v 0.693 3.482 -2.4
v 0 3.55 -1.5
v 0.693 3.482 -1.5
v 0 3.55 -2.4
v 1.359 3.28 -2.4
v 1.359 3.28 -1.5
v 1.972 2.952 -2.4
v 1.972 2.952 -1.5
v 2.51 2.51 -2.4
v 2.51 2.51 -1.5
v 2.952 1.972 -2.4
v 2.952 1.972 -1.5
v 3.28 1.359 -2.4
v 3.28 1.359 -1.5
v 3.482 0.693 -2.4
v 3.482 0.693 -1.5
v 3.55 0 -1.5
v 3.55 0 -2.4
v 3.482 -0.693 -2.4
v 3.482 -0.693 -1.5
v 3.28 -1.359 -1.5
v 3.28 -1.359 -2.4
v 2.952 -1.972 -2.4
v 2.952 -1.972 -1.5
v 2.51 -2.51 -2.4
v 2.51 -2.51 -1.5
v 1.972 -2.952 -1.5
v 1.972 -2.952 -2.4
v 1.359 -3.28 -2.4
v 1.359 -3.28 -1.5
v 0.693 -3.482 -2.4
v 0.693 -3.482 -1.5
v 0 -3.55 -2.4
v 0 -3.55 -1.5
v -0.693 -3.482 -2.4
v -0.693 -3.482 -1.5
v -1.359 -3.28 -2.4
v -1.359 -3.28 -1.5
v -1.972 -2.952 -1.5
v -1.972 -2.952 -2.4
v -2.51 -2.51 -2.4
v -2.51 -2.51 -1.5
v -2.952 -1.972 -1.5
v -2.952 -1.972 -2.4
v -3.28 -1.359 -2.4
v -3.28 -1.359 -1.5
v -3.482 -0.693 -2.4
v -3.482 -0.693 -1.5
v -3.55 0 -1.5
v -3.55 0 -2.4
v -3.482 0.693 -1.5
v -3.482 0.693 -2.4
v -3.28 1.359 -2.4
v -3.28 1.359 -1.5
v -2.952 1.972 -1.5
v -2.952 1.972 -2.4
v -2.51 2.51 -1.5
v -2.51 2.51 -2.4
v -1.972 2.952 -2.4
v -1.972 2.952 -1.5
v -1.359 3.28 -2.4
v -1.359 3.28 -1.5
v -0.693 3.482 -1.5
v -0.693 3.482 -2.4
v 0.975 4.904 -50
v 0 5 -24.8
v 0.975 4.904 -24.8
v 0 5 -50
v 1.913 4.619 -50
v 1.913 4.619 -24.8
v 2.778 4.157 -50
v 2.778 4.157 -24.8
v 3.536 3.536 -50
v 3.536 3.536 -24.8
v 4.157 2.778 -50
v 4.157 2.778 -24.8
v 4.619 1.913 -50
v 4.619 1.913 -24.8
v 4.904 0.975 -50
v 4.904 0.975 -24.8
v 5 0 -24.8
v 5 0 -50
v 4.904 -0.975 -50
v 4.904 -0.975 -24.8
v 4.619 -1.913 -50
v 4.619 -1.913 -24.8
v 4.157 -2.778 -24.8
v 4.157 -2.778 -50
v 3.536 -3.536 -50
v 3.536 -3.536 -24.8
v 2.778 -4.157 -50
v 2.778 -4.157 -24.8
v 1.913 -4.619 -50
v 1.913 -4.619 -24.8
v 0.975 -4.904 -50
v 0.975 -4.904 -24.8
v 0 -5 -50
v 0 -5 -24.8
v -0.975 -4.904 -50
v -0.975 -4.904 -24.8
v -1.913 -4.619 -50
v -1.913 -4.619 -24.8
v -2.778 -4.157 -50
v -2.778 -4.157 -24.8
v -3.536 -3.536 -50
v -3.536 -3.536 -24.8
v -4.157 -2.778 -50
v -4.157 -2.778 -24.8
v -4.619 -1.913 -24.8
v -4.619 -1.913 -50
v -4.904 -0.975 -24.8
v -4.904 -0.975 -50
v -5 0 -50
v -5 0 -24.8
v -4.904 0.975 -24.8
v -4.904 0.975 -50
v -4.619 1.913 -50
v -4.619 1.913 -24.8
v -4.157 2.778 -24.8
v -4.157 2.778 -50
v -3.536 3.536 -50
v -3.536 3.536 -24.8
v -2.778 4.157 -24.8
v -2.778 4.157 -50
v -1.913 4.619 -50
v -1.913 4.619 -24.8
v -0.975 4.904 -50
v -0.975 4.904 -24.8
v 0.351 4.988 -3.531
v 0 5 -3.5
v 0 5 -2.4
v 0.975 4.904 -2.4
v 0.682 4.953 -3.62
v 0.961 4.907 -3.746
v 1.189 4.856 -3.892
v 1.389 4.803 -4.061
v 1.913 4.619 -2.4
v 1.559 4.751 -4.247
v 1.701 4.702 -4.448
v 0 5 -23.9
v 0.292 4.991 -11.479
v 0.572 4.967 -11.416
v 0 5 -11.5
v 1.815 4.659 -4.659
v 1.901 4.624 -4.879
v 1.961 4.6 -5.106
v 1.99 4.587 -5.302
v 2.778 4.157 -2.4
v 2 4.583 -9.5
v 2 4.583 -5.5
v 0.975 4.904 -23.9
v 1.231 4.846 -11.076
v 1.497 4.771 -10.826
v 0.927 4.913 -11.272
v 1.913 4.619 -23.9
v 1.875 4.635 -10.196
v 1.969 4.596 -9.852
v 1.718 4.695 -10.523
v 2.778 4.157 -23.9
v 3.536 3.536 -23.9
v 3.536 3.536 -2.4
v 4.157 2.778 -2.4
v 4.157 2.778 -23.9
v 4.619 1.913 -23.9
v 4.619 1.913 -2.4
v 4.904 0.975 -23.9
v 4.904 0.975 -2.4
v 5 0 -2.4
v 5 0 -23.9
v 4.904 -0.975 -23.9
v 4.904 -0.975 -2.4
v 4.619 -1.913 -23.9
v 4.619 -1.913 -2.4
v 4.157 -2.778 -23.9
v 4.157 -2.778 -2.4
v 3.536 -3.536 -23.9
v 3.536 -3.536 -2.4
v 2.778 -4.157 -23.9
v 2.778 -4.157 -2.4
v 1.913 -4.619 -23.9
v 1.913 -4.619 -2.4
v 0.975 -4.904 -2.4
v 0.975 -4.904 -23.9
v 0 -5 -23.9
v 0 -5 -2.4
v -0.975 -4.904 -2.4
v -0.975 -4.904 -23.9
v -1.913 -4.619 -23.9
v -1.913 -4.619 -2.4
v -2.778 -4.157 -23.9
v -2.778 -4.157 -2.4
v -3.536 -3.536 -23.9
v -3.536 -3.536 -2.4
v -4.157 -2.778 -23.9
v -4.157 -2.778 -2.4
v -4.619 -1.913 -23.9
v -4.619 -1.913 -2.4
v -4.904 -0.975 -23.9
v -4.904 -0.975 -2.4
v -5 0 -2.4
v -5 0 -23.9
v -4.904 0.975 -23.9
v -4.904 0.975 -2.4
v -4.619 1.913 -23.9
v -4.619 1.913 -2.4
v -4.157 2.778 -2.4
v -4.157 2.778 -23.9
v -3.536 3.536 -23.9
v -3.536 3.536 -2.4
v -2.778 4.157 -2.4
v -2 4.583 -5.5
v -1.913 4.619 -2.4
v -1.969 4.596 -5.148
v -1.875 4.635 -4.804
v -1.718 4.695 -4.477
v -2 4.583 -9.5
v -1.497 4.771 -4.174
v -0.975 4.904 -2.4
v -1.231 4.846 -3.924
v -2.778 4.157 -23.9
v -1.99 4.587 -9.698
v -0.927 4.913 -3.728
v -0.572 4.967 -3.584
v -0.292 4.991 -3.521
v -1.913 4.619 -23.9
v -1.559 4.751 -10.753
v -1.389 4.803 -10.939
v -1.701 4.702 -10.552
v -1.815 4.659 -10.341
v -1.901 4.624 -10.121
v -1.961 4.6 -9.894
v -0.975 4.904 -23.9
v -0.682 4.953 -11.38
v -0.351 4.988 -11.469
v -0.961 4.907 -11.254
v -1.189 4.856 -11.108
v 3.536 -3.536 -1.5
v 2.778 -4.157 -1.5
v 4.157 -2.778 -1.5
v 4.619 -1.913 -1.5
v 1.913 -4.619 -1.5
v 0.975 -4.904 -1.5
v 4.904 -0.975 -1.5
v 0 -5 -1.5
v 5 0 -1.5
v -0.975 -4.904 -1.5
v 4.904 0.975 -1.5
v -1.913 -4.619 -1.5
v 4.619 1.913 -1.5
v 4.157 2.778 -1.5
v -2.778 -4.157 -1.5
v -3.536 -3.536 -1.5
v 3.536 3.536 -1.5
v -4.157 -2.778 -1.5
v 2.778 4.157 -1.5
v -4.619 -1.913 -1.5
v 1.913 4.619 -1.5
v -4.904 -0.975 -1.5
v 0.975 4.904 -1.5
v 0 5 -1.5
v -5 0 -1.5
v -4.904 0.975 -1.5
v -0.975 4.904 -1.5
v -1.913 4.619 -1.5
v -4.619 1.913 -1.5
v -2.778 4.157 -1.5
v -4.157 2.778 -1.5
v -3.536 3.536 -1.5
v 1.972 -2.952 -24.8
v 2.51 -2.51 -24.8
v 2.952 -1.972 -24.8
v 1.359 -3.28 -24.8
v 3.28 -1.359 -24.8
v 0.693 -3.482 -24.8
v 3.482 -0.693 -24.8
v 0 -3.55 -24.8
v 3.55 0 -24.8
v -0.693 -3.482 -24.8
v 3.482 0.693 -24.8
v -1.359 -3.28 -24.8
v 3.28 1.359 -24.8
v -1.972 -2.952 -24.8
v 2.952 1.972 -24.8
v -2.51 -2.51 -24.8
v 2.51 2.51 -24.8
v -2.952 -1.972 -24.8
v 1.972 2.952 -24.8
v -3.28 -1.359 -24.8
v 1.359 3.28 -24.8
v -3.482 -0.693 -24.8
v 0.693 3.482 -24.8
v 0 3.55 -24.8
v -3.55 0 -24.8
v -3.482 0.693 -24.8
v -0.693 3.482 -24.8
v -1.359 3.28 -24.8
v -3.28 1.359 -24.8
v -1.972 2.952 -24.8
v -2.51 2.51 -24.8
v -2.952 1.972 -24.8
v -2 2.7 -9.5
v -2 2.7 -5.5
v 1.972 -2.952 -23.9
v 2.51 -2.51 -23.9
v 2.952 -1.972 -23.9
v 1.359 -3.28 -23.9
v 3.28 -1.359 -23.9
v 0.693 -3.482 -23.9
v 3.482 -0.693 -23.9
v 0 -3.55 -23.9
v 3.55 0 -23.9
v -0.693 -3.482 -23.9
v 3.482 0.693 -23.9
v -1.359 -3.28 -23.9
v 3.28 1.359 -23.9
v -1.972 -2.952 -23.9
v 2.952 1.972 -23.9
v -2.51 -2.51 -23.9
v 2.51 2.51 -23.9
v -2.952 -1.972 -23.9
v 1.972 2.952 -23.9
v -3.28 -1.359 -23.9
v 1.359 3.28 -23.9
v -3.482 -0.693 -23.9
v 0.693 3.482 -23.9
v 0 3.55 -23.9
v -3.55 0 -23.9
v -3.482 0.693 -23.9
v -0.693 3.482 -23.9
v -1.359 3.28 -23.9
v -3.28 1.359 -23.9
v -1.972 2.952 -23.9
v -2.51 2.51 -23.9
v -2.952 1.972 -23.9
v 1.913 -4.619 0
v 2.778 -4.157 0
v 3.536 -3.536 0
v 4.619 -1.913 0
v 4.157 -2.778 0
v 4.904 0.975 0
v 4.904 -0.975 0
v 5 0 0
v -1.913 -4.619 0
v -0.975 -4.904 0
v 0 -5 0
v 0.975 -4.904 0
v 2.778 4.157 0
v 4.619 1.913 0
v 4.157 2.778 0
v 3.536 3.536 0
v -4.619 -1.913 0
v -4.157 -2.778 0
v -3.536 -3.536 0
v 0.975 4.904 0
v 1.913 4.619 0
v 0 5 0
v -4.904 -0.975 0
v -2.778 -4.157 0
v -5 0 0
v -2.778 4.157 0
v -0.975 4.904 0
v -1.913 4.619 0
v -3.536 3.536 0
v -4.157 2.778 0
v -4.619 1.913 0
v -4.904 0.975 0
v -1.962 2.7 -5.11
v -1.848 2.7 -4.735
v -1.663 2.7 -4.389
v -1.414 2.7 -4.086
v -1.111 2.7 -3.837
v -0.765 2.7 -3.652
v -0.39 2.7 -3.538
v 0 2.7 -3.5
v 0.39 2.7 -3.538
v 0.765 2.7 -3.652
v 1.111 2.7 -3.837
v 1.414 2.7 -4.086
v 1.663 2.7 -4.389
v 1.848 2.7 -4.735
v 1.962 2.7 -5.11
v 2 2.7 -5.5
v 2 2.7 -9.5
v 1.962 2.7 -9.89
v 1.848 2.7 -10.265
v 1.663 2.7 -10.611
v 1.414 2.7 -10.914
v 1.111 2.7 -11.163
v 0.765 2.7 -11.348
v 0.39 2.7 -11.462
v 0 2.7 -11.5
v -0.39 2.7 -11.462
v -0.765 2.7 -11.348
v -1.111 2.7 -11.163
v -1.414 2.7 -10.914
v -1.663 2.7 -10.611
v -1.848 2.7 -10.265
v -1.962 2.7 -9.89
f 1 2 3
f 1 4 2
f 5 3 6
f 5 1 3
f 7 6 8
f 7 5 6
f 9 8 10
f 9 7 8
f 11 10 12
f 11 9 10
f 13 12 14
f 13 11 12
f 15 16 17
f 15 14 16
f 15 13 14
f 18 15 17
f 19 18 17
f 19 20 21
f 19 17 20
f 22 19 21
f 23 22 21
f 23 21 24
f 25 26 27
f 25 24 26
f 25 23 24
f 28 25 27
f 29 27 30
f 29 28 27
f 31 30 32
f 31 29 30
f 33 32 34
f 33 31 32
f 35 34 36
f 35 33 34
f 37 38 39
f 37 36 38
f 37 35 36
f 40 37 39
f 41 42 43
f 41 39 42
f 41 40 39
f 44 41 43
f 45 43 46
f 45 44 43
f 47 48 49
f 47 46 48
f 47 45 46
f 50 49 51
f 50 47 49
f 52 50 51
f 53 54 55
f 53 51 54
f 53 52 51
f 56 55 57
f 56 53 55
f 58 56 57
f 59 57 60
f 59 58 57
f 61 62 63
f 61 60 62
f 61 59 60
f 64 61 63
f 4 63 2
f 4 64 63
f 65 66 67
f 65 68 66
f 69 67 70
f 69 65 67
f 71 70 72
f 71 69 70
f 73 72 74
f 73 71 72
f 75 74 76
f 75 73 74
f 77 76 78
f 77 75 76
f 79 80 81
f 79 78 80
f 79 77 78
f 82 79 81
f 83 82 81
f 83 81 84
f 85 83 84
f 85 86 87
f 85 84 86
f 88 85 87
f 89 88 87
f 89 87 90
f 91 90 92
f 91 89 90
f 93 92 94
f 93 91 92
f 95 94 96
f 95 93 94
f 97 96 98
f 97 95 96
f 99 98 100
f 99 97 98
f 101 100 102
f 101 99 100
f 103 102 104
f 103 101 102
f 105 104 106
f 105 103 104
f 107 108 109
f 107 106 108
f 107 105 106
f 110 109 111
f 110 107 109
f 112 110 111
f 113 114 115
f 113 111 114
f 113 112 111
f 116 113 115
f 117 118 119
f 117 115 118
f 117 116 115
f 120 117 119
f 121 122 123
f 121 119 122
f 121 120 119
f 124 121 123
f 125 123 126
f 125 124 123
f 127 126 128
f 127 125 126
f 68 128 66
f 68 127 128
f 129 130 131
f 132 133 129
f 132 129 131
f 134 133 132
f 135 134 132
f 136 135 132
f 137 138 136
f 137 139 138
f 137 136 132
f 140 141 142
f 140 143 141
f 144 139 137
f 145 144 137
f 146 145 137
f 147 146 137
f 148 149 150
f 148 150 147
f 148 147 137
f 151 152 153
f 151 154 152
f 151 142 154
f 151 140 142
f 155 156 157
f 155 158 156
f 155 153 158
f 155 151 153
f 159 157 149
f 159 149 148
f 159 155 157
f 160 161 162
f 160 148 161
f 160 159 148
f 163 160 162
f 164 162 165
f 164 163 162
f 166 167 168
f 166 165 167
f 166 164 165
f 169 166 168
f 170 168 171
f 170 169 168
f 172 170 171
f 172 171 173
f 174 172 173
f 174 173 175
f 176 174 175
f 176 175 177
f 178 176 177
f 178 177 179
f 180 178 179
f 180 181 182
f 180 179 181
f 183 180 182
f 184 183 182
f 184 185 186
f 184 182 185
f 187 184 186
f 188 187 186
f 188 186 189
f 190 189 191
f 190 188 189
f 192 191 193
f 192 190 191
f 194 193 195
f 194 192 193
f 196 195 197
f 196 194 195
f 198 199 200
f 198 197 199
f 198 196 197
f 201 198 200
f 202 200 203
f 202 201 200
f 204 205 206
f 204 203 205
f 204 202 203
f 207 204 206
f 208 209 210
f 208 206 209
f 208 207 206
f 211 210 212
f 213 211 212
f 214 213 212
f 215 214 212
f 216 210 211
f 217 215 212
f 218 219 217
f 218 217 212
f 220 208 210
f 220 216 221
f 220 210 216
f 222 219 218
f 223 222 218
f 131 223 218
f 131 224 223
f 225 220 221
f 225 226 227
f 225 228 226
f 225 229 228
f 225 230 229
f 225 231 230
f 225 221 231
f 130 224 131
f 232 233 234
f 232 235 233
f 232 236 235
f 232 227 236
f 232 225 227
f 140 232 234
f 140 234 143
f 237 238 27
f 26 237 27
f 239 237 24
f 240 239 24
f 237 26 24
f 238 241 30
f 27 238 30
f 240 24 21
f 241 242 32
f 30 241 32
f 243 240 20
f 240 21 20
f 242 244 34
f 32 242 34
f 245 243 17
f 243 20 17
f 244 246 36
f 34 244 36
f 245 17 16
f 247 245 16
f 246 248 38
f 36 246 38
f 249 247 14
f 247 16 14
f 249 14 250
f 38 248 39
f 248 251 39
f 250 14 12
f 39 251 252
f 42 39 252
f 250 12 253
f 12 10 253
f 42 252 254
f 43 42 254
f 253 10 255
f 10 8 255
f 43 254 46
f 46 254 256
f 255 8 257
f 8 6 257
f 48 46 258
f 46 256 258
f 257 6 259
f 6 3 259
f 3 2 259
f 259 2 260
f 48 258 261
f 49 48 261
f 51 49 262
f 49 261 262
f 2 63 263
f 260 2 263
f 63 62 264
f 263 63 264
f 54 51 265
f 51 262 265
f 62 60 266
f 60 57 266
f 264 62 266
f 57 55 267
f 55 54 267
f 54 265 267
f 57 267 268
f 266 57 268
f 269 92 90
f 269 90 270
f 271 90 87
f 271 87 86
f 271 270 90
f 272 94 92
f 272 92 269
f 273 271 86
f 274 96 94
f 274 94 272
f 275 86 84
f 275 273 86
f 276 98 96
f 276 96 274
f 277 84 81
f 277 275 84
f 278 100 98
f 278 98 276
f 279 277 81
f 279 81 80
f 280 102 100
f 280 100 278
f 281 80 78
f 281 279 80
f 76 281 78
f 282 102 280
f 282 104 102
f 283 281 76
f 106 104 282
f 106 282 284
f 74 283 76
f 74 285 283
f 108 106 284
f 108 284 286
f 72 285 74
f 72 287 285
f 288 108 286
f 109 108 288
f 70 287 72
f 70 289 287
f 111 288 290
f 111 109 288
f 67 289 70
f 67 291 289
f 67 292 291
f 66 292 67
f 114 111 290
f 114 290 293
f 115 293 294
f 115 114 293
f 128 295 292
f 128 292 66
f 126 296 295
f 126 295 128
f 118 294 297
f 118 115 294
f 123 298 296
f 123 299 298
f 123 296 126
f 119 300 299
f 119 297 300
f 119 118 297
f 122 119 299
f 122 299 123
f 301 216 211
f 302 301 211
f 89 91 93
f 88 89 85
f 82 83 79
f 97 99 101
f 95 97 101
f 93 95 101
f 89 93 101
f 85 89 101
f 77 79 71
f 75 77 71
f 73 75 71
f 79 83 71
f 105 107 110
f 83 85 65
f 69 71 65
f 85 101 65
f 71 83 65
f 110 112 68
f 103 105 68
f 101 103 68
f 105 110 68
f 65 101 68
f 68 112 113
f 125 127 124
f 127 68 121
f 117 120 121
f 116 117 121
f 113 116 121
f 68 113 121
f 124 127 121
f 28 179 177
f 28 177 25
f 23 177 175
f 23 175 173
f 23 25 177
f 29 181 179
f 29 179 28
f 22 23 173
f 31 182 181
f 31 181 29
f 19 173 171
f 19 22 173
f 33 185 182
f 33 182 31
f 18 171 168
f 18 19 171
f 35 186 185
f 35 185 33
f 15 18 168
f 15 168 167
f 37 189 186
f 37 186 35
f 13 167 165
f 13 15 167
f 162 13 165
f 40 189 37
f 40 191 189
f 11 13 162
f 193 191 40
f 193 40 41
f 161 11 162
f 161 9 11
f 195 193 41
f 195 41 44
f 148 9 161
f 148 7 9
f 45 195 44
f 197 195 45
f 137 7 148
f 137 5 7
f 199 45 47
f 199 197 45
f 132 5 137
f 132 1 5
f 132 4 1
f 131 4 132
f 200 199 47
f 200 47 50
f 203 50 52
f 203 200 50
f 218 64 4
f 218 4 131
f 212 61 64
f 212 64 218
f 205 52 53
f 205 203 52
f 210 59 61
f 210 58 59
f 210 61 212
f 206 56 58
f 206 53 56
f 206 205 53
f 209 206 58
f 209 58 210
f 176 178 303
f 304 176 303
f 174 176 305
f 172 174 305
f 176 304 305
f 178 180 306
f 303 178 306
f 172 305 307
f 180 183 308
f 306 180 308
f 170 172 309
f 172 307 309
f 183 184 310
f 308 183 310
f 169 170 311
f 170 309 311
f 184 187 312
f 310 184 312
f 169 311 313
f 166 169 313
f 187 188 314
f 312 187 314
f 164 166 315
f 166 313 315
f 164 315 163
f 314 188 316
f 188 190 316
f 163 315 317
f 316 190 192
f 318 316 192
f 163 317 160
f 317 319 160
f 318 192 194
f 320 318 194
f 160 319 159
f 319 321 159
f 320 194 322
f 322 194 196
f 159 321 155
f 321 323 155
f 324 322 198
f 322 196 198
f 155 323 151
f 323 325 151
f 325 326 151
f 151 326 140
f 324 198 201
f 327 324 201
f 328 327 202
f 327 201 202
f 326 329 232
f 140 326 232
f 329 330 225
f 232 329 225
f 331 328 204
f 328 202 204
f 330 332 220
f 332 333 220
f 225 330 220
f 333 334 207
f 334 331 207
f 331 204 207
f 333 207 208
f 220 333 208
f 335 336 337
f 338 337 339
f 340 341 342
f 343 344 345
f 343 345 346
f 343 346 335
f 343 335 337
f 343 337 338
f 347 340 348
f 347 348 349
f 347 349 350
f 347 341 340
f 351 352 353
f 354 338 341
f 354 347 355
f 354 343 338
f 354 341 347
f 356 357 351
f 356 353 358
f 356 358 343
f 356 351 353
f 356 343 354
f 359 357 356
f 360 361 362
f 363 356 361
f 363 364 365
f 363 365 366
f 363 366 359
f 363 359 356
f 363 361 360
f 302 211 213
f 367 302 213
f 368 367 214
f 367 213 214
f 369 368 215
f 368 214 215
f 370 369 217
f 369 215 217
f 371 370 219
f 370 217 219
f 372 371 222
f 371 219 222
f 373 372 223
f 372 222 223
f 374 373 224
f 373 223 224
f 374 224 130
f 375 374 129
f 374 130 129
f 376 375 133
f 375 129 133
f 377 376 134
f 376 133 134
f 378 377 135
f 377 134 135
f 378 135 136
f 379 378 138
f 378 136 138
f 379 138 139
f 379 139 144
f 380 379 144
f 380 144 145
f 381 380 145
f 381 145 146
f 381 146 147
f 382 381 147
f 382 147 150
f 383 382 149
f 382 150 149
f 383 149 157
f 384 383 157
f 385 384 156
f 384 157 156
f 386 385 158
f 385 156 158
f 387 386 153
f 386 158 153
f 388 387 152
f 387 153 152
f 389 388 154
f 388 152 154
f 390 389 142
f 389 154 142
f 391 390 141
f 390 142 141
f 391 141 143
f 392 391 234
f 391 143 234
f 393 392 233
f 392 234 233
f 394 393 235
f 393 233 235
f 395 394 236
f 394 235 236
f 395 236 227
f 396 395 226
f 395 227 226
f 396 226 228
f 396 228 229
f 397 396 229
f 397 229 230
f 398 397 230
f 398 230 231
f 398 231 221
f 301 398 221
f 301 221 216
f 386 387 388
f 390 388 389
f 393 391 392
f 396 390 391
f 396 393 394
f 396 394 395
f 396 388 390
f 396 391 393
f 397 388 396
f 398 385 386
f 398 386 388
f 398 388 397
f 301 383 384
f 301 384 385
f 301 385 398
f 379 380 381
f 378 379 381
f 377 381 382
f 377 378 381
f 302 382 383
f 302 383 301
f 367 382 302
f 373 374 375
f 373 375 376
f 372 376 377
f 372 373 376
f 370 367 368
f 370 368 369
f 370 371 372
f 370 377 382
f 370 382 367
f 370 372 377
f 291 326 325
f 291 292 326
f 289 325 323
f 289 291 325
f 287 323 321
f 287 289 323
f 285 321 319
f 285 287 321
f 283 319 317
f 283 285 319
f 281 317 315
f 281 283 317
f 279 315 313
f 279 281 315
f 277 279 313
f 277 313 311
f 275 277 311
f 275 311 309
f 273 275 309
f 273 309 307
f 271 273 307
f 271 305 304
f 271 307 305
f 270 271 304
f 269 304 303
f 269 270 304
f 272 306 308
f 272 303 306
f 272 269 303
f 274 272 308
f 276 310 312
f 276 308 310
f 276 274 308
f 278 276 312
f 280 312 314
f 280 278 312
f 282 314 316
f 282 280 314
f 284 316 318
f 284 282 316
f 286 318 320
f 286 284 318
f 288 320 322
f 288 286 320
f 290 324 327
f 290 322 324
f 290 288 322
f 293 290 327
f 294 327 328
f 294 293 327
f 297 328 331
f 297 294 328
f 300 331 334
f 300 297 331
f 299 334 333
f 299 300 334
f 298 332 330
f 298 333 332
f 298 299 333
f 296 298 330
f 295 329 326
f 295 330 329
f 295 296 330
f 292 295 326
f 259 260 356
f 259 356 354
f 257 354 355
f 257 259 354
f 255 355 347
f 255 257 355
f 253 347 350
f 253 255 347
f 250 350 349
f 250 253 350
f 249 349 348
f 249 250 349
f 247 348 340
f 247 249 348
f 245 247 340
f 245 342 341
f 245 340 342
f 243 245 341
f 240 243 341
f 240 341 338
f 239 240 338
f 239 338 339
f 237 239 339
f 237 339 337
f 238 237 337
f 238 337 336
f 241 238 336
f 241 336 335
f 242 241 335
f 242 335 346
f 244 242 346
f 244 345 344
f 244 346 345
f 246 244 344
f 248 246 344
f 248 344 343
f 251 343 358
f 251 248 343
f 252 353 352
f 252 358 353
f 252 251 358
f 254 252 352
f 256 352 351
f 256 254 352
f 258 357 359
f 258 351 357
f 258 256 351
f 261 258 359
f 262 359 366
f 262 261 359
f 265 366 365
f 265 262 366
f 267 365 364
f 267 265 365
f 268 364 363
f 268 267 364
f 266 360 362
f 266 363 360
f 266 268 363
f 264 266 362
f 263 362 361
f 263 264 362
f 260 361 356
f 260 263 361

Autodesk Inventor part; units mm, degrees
ref_plane "YZ Plane" through (0, 0, 0) normal (1, 0, 0) x (0, 1, 0)
ref_plane "XY Plane" through (0, 0, 0) normal (0, 0, 1) x (1, 0, 0)
sketch "Sketch5" plane through (0, 0, 0) normal (1, 0, 0) x (0, 1, 0)
  line L0 (0, 0) -> (5, 0)
  line L1 (5, 0) -> (5, -1.5)
  line L2 (5, -1.5) -> (3.55, -1.5)
  line L3 (3.55, -1.5) -> (3.55, -2.4)
  line L4 (3.55, -2.4) -> (5, -2.4)
  line L5 (5, -2.4) -> (5, -23.9)
  line L6 (5, -23.9) -> (3.55, -23.9)
  line L7 (3.55, -23.9) -> (3.55, -24.8)
  line L8 (3.55, -24.8) -> (5, -24.8)
  line L9 (5, -24.8) -> (5, -50)
  line L10 (5, -50) -> (0, -50)
  line L11 (0, -50) -> (0, 0)
  dimension "d14" = 0.9
  dimension "d15" = 1.5
  dimension "d16" = 0.9
  dimension "d17" = 50
  dimension "d18" = 10
  dimension "d19" = 7.1
  dimension "d28" = 23.3
revolve "Revolution2" add sketch "Sketch5" angle 360 about axis through (0, 0, -50) along (0, 0, 1)
ref_plane "Work Plane1" through (0, 5, 0) normal (0, 1, 0) x (-1, 0, 0)
sketch "Sketch6" plane through (0, 5, 0) normal (0, 1, 0) x (-1, 0, 0)
  line L0 (0, -5.5) -> (0, -9.5) construction
  line L1 (-2, -5.5) -> (-2, -9.5)
  line L2 (2, -9.5) -> (2, -5.5)
  arc A0 (2, -5.5) -> (-2, -5.5) centre (0, -5.5) ccw
  arc A1 (-2, -9.5) -> (2, -9.5) centre (0, -9.5) ccw
  line L3 (5, -1.5) -> (-5, -1.5) projected
  point P0 (0, 0)
  point P1 (0, -7.5)
  point P2 (0, -3.5)
  point P3 (0, -11.5)
  dimension "d22" = 4
  dimension "d23" = 8
  dimension "d24" = 2
extrude "Extrusion4" cut sketch "Sketch6" against normal blind 2.3
properties part number "gearbox_shaft2" material "Steel"
